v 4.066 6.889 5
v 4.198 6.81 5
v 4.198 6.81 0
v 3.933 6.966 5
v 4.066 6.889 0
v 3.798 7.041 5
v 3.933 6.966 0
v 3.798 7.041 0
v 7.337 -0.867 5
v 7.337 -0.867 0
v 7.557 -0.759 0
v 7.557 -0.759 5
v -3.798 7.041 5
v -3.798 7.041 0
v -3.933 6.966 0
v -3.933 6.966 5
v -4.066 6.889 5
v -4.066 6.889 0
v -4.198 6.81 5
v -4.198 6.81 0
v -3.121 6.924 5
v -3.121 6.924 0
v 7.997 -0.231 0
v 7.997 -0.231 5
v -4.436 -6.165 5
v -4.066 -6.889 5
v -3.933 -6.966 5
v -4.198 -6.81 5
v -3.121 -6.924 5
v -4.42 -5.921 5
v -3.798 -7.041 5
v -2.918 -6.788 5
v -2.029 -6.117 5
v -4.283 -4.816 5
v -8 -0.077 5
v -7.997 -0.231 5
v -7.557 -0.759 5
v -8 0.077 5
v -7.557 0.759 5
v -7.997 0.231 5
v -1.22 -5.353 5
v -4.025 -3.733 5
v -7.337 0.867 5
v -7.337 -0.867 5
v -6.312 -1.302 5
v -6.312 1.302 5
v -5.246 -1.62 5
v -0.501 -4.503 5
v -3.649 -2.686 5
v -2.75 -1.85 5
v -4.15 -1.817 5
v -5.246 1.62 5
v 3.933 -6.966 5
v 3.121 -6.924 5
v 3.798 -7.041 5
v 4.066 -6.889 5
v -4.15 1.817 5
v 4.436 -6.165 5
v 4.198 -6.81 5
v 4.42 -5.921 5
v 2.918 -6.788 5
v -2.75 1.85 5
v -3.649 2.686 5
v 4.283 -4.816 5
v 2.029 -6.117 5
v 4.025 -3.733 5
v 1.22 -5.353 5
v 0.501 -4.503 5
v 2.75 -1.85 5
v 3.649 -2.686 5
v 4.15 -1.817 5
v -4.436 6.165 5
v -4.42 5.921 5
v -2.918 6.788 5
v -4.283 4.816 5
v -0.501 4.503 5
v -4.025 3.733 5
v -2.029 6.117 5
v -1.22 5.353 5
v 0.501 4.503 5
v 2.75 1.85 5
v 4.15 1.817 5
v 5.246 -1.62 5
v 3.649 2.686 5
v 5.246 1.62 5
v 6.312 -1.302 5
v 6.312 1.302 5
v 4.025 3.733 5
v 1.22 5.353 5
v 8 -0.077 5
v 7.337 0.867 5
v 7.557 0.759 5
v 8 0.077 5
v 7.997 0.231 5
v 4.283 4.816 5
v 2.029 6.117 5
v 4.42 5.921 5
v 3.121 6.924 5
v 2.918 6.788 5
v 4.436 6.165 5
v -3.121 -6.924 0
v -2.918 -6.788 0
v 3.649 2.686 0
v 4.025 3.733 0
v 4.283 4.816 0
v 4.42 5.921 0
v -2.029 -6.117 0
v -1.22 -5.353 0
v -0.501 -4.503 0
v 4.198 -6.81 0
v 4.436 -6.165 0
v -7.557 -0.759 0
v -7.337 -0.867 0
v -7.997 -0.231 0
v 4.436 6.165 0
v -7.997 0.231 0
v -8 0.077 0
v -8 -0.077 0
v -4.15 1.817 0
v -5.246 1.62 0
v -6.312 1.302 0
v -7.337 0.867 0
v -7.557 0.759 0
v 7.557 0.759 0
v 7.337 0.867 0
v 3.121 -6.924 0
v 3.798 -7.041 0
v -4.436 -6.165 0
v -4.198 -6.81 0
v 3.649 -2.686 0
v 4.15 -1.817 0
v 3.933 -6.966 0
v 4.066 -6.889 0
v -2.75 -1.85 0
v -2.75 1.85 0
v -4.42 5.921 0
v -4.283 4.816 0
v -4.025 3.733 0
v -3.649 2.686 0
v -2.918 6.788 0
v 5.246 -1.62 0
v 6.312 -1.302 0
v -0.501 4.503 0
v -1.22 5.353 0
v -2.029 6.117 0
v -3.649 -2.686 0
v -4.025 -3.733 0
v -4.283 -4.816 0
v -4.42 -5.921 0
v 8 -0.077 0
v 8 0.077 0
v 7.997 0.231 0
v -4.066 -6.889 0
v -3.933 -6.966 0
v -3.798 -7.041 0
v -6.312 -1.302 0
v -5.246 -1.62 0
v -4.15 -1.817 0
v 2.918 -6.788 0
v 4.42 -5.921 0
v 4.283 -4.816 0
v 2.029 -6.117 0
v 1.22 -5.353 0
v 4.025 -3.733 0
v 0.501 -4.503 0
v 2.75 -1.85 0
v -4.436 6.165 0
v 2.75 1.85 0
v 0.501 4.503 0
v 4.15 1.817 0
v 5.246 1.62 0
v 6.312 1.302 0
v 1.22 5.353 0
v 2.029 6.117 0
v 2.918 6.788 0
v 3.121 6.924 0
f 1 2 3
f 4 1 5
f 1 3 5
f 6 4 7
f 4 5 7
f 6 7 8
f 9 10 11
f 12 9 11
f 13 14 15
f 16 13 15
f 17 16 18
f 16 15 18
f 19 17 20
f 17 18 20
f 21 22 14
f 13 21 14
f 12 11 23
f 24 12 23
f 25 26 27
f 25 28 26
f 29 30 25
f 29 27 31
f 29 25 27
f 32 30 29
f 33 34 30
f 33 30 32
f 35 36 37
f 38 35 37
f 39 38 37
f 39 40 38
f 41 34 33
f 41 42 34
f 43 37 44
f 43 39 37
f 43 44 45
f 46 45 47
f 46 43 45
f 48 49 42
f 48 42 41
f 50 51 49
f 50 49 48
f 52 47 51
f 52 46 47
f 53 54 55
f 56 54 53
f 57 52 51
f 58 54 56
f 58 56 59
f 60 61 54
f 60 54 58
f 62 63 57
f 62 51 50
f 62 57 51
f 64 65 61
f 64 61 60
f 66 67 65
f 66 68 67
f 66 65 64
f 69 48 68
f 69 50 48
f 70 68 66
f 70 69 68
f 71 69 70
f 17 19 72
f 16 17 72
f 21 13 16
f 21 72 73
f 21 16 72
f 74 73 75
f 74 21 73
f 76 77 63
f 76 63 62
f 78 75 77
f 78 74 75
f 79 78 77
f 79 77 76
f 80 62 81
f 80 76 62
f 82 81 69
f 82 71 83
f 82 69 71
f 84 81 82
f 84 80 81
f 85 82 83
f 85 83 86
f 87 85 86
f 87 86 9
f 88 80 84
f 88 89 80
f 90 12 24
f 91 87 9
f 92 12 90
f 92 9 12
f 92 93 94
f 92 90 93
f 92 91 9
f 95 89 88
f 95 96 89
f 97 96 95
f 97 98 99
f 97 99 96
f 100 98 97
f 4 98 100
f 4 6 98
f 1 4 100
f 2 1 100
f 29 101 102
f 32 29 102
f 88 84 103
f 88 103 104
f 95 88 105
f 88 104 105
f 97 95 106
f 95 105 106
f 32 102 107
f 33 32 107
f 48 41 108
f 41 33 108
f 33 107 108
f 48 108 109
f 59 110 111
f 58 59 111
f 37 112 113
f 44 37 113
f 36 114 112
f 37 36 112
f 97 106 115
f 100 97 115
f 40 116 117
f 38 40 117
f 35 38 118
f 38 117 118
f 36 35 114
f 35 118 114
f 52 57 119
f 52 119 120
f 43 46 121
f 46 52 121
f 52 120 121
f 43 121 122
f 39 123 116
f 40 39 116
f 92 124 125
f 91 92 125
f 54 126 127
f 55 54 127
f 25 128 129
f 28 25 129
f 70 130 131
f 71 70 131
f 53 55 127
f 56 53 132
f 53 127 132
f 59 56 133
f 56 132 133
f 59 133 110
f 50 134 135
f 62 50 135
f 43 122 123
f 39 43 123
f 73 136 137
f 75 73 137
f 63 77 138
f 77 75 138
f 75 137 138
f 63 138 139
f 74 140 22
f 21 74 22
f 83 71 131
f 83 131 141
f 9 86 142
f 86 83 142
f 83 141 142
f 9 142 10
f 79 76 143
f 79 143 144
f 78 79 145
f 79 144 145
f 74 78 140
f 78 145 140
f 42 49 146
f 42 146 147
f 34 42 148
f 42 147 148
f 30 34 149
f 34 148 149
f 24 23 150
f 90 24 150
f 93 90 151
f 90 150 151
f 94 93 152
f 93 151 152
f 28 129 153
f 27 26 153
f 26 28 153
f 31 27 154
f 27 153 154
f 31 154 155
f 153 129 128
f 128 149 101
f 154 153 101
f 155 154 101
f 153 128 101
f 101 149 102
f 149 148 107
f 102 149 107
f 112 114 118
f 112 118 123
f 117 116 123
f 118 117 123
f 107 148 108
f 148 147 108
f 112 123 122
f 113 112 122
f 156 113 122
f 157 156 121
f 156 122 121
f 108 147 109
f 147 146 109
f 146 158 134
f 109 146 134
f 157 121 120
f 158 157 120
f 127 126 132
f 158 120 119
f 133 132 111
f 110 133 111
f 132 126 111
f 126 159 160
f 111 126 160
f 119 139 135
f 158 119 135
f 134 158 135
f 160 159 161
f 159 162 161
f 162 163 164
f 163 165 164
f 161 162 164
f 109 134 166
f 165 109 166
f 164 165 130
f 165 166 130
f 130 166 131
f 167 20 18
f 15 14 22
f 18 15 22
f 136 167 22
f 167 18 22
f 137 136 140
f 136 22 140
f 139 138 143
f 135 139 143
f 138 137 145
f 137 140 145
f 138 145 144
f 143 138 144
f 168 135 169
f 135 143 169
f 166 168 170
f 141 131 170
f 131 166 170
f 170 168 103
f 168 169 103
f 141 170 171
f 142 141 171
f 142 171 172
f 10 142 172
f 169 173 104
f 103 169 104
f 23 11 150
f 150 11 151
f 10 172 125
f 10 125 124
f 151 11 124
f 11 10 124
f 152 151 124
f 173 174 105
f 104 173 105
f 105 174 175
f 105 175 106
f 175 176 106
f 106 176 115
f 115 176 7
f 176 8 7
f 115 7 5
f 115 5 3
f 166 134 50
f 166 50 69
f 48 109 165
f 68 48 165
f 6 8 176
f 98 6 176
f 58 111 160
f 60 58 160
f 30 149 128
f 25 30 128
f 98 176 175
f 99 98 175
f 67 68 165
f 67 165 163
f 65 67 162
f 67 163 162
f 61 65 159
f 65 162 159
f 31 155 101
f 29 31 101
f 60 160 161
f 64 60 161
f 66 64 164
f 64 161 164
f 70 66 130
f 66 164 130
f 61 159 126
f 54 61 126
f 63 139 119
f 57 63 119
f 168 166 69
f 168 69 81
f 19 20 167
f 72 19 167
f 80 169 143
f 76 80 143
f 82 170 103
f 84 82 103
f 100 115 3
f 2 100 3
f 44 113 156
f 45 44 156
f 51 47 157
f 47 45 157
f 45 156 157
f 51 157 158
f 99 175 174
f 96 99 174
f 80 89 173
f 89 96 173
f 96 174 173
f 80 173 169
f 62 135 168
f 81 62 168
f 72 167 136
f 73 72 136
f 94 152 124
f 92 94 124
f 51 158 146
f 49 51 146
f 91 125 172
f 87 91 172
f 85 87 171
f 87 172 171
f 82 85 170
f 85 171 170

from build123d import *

# Parameters (mm, degrees)
SKETCH1_R           = 8
SKETCH1_W           = 5.5
SKETCH1_H           = 3.7
BOSS_EXTRUDE1_DEPTH = 5
CUT_EXTRUDE1_DEPTH  = 13.369316877
CIRPATTERN1_COUNT   = 6
FILLET1_R           = 10


with BuildPart() as part:
    # Sketch1 → Boss-Extrude1 (new body)
    with BuildSketch(Plane.XY):
        Circle(SKETCH1_R)
        Rectangle(SKETCH1_W, SKETCH1_H, mode=Mode.SUBTRACT)
    extrude(amount=BOSS_EXTRUDE1_DEPTH)

    # Sketch2 → Cut-Extrude1 (cut, through all)
    with BuildSketch(Plane.XY):
        Polygon((-7.331932906, 22.221764399), (0, 24.952212466), (7.331932906, 22.221764399), (3.798424573, 7.040736522), (3.120998591, 6.924019842), (1.330058439, 5.723612136), (0.501497444, 4.50257488), (-0.501497444, 4.50257488), (-1.330058439, 5.723612136), (-3.120998591, 6.924019842), (-3.798424573, 7.040736522), align=None)
    cut_extrude1 = extrude(amount=CUT_EXTRUDE1_DEPTH, mode=Mode.SUBTRACT)

    # CirPattern1: Cut-Extrude1 ×6 about axis
    cirpattern1_axis = Axis((0, 0, 0), (0, 0, 1))
    for i in range(1, CIRPATTERN1_COUNT):
        add(cut_extrude1.rotate(cirpattern1_axis, i * 360 / CIRPATTERN1_COUNT), mode=Mode.SUBTRACT)

    # Fillet1
    # the kernel refuses this fillet: 10 mm, written as the material it takes off along each edge
    with BuildSketch(Plane(origin=(-1.330058439, -5.723612136, -4.777865205), x_dir=(0.5615014183372642, 0.8274757743917586, 0), z_dir=(0, 0, 1)), Plane(origin=(5.621822731, 1.709941671, -4.777865205), x_dir=(-0.997365750808096, 0.07253660534518461, 0), z_dir=(0, 0, 1)), Plane(origin=(4.291764291, -4.013670465, -4.777865205), x_dir=(-0.43586433247083195, 0.9000123797369435, 0), z_dir=(0, 0, 1)), Plane(origin=(-5.621822731, -1.709941671, -4.777865205), x_dir=(0.997365750808096, -0.07253660534518423, 0), z_dir=(0, 0, 1)), Plane(origin=(-4.291764291, 4.013670465, -4.777865205), x_dir=(0.43586433247083256, -0.900012379736943, 0), z_dir=(0, 0, 1)), Plane(origin=(1.330058439, 5.723612136, -4.777865205), x_dir=(-0.561501418337264, -0.8274757743917588, 0), z_dir=(0, 0, 1))) as fillet1_piece_1:
        with BuildLine():
            CenterArc((1.975419419, 9.987502063), FILLET1_R, 247.992328485, 19.142820558)
            Line((-1.771887917, 0.716165173), (-1.846834064, 0.530738436))
            Line((-1.846834064, 0.530738436), (-0.074946147, -0.185426738))
            Line((-0.074946147, -0.185426738), (0, -0.2))
            ThreePointArc((0, -0.2), (0.737808461, -0.2), (1.465620873, -0.199750041))
            Line((1.465620873, -0.199750041), (1.475616922, 0))
        make_face()
    extrude(amount=14.55573041, mode=Mode.SUBTRACT)
    with BuildSketch(Plane(origin=(5.621822731, -1.709941671, -4.777865205), x_dir=(0.8975096924716217, 0.44099473003596645, 0), z_dir=(0, 0, 1)), Plane(origin=(1.330058439, -5.723612136, -4.777865205), x_dir=(0.8306674853820185, -0.5567688288052, 0), z_dir=(0, 0, 1)), Plane(origin=(-4.291764291, -4.013670465, -4.777865205), x_dir=(-0.06684220708960342, -0.9977635588411669, 0), z_dir=(0, 0, 1)), Plane(origin=(-5.621822731, 1.709941671, -4.777865205), x_dir=(-0.8975096924716216, -0.44099473003596684, 0), z_dir=(0, 0, 1)), Plane(origin=(4.291764291, 4.013670465, -4.777865205), x_dir=(0.06684220708960296, 0.9977635588411669, 0), z_dir=(0, 0, 1)), Plane(origin=(-1.330058439, 5.723612136, -4.777865205), x_dir=(-0.8306674853820185, 0.5567688288052001, 0), z_dir=(0, 0, 1))) as fillet1_piece_2:
        with BuildLine():
            CenterArc((1.911146082, 10), FILLET1_R, 250.857179442, 19.142820558)
            Line((-1.368094161, 0.552959012), (-1.433678966, 0.364018192))
            ThreePointArc((-1.433678966, 0.364018192), (-0.758993227, 0.091052768), (-0.074946147, -0.185426738))
            Line((-0.074946147, -0.185426738), (0, -0.2))
            Line((0, -0.2), (1.911146082, -0.2))
            Line((1.911146082, -0.2), (1.911146082, 0))
        make_face()
    extrude(amount=14.55573041, mode=Mode.SUBTRACT)


solid = part.part
